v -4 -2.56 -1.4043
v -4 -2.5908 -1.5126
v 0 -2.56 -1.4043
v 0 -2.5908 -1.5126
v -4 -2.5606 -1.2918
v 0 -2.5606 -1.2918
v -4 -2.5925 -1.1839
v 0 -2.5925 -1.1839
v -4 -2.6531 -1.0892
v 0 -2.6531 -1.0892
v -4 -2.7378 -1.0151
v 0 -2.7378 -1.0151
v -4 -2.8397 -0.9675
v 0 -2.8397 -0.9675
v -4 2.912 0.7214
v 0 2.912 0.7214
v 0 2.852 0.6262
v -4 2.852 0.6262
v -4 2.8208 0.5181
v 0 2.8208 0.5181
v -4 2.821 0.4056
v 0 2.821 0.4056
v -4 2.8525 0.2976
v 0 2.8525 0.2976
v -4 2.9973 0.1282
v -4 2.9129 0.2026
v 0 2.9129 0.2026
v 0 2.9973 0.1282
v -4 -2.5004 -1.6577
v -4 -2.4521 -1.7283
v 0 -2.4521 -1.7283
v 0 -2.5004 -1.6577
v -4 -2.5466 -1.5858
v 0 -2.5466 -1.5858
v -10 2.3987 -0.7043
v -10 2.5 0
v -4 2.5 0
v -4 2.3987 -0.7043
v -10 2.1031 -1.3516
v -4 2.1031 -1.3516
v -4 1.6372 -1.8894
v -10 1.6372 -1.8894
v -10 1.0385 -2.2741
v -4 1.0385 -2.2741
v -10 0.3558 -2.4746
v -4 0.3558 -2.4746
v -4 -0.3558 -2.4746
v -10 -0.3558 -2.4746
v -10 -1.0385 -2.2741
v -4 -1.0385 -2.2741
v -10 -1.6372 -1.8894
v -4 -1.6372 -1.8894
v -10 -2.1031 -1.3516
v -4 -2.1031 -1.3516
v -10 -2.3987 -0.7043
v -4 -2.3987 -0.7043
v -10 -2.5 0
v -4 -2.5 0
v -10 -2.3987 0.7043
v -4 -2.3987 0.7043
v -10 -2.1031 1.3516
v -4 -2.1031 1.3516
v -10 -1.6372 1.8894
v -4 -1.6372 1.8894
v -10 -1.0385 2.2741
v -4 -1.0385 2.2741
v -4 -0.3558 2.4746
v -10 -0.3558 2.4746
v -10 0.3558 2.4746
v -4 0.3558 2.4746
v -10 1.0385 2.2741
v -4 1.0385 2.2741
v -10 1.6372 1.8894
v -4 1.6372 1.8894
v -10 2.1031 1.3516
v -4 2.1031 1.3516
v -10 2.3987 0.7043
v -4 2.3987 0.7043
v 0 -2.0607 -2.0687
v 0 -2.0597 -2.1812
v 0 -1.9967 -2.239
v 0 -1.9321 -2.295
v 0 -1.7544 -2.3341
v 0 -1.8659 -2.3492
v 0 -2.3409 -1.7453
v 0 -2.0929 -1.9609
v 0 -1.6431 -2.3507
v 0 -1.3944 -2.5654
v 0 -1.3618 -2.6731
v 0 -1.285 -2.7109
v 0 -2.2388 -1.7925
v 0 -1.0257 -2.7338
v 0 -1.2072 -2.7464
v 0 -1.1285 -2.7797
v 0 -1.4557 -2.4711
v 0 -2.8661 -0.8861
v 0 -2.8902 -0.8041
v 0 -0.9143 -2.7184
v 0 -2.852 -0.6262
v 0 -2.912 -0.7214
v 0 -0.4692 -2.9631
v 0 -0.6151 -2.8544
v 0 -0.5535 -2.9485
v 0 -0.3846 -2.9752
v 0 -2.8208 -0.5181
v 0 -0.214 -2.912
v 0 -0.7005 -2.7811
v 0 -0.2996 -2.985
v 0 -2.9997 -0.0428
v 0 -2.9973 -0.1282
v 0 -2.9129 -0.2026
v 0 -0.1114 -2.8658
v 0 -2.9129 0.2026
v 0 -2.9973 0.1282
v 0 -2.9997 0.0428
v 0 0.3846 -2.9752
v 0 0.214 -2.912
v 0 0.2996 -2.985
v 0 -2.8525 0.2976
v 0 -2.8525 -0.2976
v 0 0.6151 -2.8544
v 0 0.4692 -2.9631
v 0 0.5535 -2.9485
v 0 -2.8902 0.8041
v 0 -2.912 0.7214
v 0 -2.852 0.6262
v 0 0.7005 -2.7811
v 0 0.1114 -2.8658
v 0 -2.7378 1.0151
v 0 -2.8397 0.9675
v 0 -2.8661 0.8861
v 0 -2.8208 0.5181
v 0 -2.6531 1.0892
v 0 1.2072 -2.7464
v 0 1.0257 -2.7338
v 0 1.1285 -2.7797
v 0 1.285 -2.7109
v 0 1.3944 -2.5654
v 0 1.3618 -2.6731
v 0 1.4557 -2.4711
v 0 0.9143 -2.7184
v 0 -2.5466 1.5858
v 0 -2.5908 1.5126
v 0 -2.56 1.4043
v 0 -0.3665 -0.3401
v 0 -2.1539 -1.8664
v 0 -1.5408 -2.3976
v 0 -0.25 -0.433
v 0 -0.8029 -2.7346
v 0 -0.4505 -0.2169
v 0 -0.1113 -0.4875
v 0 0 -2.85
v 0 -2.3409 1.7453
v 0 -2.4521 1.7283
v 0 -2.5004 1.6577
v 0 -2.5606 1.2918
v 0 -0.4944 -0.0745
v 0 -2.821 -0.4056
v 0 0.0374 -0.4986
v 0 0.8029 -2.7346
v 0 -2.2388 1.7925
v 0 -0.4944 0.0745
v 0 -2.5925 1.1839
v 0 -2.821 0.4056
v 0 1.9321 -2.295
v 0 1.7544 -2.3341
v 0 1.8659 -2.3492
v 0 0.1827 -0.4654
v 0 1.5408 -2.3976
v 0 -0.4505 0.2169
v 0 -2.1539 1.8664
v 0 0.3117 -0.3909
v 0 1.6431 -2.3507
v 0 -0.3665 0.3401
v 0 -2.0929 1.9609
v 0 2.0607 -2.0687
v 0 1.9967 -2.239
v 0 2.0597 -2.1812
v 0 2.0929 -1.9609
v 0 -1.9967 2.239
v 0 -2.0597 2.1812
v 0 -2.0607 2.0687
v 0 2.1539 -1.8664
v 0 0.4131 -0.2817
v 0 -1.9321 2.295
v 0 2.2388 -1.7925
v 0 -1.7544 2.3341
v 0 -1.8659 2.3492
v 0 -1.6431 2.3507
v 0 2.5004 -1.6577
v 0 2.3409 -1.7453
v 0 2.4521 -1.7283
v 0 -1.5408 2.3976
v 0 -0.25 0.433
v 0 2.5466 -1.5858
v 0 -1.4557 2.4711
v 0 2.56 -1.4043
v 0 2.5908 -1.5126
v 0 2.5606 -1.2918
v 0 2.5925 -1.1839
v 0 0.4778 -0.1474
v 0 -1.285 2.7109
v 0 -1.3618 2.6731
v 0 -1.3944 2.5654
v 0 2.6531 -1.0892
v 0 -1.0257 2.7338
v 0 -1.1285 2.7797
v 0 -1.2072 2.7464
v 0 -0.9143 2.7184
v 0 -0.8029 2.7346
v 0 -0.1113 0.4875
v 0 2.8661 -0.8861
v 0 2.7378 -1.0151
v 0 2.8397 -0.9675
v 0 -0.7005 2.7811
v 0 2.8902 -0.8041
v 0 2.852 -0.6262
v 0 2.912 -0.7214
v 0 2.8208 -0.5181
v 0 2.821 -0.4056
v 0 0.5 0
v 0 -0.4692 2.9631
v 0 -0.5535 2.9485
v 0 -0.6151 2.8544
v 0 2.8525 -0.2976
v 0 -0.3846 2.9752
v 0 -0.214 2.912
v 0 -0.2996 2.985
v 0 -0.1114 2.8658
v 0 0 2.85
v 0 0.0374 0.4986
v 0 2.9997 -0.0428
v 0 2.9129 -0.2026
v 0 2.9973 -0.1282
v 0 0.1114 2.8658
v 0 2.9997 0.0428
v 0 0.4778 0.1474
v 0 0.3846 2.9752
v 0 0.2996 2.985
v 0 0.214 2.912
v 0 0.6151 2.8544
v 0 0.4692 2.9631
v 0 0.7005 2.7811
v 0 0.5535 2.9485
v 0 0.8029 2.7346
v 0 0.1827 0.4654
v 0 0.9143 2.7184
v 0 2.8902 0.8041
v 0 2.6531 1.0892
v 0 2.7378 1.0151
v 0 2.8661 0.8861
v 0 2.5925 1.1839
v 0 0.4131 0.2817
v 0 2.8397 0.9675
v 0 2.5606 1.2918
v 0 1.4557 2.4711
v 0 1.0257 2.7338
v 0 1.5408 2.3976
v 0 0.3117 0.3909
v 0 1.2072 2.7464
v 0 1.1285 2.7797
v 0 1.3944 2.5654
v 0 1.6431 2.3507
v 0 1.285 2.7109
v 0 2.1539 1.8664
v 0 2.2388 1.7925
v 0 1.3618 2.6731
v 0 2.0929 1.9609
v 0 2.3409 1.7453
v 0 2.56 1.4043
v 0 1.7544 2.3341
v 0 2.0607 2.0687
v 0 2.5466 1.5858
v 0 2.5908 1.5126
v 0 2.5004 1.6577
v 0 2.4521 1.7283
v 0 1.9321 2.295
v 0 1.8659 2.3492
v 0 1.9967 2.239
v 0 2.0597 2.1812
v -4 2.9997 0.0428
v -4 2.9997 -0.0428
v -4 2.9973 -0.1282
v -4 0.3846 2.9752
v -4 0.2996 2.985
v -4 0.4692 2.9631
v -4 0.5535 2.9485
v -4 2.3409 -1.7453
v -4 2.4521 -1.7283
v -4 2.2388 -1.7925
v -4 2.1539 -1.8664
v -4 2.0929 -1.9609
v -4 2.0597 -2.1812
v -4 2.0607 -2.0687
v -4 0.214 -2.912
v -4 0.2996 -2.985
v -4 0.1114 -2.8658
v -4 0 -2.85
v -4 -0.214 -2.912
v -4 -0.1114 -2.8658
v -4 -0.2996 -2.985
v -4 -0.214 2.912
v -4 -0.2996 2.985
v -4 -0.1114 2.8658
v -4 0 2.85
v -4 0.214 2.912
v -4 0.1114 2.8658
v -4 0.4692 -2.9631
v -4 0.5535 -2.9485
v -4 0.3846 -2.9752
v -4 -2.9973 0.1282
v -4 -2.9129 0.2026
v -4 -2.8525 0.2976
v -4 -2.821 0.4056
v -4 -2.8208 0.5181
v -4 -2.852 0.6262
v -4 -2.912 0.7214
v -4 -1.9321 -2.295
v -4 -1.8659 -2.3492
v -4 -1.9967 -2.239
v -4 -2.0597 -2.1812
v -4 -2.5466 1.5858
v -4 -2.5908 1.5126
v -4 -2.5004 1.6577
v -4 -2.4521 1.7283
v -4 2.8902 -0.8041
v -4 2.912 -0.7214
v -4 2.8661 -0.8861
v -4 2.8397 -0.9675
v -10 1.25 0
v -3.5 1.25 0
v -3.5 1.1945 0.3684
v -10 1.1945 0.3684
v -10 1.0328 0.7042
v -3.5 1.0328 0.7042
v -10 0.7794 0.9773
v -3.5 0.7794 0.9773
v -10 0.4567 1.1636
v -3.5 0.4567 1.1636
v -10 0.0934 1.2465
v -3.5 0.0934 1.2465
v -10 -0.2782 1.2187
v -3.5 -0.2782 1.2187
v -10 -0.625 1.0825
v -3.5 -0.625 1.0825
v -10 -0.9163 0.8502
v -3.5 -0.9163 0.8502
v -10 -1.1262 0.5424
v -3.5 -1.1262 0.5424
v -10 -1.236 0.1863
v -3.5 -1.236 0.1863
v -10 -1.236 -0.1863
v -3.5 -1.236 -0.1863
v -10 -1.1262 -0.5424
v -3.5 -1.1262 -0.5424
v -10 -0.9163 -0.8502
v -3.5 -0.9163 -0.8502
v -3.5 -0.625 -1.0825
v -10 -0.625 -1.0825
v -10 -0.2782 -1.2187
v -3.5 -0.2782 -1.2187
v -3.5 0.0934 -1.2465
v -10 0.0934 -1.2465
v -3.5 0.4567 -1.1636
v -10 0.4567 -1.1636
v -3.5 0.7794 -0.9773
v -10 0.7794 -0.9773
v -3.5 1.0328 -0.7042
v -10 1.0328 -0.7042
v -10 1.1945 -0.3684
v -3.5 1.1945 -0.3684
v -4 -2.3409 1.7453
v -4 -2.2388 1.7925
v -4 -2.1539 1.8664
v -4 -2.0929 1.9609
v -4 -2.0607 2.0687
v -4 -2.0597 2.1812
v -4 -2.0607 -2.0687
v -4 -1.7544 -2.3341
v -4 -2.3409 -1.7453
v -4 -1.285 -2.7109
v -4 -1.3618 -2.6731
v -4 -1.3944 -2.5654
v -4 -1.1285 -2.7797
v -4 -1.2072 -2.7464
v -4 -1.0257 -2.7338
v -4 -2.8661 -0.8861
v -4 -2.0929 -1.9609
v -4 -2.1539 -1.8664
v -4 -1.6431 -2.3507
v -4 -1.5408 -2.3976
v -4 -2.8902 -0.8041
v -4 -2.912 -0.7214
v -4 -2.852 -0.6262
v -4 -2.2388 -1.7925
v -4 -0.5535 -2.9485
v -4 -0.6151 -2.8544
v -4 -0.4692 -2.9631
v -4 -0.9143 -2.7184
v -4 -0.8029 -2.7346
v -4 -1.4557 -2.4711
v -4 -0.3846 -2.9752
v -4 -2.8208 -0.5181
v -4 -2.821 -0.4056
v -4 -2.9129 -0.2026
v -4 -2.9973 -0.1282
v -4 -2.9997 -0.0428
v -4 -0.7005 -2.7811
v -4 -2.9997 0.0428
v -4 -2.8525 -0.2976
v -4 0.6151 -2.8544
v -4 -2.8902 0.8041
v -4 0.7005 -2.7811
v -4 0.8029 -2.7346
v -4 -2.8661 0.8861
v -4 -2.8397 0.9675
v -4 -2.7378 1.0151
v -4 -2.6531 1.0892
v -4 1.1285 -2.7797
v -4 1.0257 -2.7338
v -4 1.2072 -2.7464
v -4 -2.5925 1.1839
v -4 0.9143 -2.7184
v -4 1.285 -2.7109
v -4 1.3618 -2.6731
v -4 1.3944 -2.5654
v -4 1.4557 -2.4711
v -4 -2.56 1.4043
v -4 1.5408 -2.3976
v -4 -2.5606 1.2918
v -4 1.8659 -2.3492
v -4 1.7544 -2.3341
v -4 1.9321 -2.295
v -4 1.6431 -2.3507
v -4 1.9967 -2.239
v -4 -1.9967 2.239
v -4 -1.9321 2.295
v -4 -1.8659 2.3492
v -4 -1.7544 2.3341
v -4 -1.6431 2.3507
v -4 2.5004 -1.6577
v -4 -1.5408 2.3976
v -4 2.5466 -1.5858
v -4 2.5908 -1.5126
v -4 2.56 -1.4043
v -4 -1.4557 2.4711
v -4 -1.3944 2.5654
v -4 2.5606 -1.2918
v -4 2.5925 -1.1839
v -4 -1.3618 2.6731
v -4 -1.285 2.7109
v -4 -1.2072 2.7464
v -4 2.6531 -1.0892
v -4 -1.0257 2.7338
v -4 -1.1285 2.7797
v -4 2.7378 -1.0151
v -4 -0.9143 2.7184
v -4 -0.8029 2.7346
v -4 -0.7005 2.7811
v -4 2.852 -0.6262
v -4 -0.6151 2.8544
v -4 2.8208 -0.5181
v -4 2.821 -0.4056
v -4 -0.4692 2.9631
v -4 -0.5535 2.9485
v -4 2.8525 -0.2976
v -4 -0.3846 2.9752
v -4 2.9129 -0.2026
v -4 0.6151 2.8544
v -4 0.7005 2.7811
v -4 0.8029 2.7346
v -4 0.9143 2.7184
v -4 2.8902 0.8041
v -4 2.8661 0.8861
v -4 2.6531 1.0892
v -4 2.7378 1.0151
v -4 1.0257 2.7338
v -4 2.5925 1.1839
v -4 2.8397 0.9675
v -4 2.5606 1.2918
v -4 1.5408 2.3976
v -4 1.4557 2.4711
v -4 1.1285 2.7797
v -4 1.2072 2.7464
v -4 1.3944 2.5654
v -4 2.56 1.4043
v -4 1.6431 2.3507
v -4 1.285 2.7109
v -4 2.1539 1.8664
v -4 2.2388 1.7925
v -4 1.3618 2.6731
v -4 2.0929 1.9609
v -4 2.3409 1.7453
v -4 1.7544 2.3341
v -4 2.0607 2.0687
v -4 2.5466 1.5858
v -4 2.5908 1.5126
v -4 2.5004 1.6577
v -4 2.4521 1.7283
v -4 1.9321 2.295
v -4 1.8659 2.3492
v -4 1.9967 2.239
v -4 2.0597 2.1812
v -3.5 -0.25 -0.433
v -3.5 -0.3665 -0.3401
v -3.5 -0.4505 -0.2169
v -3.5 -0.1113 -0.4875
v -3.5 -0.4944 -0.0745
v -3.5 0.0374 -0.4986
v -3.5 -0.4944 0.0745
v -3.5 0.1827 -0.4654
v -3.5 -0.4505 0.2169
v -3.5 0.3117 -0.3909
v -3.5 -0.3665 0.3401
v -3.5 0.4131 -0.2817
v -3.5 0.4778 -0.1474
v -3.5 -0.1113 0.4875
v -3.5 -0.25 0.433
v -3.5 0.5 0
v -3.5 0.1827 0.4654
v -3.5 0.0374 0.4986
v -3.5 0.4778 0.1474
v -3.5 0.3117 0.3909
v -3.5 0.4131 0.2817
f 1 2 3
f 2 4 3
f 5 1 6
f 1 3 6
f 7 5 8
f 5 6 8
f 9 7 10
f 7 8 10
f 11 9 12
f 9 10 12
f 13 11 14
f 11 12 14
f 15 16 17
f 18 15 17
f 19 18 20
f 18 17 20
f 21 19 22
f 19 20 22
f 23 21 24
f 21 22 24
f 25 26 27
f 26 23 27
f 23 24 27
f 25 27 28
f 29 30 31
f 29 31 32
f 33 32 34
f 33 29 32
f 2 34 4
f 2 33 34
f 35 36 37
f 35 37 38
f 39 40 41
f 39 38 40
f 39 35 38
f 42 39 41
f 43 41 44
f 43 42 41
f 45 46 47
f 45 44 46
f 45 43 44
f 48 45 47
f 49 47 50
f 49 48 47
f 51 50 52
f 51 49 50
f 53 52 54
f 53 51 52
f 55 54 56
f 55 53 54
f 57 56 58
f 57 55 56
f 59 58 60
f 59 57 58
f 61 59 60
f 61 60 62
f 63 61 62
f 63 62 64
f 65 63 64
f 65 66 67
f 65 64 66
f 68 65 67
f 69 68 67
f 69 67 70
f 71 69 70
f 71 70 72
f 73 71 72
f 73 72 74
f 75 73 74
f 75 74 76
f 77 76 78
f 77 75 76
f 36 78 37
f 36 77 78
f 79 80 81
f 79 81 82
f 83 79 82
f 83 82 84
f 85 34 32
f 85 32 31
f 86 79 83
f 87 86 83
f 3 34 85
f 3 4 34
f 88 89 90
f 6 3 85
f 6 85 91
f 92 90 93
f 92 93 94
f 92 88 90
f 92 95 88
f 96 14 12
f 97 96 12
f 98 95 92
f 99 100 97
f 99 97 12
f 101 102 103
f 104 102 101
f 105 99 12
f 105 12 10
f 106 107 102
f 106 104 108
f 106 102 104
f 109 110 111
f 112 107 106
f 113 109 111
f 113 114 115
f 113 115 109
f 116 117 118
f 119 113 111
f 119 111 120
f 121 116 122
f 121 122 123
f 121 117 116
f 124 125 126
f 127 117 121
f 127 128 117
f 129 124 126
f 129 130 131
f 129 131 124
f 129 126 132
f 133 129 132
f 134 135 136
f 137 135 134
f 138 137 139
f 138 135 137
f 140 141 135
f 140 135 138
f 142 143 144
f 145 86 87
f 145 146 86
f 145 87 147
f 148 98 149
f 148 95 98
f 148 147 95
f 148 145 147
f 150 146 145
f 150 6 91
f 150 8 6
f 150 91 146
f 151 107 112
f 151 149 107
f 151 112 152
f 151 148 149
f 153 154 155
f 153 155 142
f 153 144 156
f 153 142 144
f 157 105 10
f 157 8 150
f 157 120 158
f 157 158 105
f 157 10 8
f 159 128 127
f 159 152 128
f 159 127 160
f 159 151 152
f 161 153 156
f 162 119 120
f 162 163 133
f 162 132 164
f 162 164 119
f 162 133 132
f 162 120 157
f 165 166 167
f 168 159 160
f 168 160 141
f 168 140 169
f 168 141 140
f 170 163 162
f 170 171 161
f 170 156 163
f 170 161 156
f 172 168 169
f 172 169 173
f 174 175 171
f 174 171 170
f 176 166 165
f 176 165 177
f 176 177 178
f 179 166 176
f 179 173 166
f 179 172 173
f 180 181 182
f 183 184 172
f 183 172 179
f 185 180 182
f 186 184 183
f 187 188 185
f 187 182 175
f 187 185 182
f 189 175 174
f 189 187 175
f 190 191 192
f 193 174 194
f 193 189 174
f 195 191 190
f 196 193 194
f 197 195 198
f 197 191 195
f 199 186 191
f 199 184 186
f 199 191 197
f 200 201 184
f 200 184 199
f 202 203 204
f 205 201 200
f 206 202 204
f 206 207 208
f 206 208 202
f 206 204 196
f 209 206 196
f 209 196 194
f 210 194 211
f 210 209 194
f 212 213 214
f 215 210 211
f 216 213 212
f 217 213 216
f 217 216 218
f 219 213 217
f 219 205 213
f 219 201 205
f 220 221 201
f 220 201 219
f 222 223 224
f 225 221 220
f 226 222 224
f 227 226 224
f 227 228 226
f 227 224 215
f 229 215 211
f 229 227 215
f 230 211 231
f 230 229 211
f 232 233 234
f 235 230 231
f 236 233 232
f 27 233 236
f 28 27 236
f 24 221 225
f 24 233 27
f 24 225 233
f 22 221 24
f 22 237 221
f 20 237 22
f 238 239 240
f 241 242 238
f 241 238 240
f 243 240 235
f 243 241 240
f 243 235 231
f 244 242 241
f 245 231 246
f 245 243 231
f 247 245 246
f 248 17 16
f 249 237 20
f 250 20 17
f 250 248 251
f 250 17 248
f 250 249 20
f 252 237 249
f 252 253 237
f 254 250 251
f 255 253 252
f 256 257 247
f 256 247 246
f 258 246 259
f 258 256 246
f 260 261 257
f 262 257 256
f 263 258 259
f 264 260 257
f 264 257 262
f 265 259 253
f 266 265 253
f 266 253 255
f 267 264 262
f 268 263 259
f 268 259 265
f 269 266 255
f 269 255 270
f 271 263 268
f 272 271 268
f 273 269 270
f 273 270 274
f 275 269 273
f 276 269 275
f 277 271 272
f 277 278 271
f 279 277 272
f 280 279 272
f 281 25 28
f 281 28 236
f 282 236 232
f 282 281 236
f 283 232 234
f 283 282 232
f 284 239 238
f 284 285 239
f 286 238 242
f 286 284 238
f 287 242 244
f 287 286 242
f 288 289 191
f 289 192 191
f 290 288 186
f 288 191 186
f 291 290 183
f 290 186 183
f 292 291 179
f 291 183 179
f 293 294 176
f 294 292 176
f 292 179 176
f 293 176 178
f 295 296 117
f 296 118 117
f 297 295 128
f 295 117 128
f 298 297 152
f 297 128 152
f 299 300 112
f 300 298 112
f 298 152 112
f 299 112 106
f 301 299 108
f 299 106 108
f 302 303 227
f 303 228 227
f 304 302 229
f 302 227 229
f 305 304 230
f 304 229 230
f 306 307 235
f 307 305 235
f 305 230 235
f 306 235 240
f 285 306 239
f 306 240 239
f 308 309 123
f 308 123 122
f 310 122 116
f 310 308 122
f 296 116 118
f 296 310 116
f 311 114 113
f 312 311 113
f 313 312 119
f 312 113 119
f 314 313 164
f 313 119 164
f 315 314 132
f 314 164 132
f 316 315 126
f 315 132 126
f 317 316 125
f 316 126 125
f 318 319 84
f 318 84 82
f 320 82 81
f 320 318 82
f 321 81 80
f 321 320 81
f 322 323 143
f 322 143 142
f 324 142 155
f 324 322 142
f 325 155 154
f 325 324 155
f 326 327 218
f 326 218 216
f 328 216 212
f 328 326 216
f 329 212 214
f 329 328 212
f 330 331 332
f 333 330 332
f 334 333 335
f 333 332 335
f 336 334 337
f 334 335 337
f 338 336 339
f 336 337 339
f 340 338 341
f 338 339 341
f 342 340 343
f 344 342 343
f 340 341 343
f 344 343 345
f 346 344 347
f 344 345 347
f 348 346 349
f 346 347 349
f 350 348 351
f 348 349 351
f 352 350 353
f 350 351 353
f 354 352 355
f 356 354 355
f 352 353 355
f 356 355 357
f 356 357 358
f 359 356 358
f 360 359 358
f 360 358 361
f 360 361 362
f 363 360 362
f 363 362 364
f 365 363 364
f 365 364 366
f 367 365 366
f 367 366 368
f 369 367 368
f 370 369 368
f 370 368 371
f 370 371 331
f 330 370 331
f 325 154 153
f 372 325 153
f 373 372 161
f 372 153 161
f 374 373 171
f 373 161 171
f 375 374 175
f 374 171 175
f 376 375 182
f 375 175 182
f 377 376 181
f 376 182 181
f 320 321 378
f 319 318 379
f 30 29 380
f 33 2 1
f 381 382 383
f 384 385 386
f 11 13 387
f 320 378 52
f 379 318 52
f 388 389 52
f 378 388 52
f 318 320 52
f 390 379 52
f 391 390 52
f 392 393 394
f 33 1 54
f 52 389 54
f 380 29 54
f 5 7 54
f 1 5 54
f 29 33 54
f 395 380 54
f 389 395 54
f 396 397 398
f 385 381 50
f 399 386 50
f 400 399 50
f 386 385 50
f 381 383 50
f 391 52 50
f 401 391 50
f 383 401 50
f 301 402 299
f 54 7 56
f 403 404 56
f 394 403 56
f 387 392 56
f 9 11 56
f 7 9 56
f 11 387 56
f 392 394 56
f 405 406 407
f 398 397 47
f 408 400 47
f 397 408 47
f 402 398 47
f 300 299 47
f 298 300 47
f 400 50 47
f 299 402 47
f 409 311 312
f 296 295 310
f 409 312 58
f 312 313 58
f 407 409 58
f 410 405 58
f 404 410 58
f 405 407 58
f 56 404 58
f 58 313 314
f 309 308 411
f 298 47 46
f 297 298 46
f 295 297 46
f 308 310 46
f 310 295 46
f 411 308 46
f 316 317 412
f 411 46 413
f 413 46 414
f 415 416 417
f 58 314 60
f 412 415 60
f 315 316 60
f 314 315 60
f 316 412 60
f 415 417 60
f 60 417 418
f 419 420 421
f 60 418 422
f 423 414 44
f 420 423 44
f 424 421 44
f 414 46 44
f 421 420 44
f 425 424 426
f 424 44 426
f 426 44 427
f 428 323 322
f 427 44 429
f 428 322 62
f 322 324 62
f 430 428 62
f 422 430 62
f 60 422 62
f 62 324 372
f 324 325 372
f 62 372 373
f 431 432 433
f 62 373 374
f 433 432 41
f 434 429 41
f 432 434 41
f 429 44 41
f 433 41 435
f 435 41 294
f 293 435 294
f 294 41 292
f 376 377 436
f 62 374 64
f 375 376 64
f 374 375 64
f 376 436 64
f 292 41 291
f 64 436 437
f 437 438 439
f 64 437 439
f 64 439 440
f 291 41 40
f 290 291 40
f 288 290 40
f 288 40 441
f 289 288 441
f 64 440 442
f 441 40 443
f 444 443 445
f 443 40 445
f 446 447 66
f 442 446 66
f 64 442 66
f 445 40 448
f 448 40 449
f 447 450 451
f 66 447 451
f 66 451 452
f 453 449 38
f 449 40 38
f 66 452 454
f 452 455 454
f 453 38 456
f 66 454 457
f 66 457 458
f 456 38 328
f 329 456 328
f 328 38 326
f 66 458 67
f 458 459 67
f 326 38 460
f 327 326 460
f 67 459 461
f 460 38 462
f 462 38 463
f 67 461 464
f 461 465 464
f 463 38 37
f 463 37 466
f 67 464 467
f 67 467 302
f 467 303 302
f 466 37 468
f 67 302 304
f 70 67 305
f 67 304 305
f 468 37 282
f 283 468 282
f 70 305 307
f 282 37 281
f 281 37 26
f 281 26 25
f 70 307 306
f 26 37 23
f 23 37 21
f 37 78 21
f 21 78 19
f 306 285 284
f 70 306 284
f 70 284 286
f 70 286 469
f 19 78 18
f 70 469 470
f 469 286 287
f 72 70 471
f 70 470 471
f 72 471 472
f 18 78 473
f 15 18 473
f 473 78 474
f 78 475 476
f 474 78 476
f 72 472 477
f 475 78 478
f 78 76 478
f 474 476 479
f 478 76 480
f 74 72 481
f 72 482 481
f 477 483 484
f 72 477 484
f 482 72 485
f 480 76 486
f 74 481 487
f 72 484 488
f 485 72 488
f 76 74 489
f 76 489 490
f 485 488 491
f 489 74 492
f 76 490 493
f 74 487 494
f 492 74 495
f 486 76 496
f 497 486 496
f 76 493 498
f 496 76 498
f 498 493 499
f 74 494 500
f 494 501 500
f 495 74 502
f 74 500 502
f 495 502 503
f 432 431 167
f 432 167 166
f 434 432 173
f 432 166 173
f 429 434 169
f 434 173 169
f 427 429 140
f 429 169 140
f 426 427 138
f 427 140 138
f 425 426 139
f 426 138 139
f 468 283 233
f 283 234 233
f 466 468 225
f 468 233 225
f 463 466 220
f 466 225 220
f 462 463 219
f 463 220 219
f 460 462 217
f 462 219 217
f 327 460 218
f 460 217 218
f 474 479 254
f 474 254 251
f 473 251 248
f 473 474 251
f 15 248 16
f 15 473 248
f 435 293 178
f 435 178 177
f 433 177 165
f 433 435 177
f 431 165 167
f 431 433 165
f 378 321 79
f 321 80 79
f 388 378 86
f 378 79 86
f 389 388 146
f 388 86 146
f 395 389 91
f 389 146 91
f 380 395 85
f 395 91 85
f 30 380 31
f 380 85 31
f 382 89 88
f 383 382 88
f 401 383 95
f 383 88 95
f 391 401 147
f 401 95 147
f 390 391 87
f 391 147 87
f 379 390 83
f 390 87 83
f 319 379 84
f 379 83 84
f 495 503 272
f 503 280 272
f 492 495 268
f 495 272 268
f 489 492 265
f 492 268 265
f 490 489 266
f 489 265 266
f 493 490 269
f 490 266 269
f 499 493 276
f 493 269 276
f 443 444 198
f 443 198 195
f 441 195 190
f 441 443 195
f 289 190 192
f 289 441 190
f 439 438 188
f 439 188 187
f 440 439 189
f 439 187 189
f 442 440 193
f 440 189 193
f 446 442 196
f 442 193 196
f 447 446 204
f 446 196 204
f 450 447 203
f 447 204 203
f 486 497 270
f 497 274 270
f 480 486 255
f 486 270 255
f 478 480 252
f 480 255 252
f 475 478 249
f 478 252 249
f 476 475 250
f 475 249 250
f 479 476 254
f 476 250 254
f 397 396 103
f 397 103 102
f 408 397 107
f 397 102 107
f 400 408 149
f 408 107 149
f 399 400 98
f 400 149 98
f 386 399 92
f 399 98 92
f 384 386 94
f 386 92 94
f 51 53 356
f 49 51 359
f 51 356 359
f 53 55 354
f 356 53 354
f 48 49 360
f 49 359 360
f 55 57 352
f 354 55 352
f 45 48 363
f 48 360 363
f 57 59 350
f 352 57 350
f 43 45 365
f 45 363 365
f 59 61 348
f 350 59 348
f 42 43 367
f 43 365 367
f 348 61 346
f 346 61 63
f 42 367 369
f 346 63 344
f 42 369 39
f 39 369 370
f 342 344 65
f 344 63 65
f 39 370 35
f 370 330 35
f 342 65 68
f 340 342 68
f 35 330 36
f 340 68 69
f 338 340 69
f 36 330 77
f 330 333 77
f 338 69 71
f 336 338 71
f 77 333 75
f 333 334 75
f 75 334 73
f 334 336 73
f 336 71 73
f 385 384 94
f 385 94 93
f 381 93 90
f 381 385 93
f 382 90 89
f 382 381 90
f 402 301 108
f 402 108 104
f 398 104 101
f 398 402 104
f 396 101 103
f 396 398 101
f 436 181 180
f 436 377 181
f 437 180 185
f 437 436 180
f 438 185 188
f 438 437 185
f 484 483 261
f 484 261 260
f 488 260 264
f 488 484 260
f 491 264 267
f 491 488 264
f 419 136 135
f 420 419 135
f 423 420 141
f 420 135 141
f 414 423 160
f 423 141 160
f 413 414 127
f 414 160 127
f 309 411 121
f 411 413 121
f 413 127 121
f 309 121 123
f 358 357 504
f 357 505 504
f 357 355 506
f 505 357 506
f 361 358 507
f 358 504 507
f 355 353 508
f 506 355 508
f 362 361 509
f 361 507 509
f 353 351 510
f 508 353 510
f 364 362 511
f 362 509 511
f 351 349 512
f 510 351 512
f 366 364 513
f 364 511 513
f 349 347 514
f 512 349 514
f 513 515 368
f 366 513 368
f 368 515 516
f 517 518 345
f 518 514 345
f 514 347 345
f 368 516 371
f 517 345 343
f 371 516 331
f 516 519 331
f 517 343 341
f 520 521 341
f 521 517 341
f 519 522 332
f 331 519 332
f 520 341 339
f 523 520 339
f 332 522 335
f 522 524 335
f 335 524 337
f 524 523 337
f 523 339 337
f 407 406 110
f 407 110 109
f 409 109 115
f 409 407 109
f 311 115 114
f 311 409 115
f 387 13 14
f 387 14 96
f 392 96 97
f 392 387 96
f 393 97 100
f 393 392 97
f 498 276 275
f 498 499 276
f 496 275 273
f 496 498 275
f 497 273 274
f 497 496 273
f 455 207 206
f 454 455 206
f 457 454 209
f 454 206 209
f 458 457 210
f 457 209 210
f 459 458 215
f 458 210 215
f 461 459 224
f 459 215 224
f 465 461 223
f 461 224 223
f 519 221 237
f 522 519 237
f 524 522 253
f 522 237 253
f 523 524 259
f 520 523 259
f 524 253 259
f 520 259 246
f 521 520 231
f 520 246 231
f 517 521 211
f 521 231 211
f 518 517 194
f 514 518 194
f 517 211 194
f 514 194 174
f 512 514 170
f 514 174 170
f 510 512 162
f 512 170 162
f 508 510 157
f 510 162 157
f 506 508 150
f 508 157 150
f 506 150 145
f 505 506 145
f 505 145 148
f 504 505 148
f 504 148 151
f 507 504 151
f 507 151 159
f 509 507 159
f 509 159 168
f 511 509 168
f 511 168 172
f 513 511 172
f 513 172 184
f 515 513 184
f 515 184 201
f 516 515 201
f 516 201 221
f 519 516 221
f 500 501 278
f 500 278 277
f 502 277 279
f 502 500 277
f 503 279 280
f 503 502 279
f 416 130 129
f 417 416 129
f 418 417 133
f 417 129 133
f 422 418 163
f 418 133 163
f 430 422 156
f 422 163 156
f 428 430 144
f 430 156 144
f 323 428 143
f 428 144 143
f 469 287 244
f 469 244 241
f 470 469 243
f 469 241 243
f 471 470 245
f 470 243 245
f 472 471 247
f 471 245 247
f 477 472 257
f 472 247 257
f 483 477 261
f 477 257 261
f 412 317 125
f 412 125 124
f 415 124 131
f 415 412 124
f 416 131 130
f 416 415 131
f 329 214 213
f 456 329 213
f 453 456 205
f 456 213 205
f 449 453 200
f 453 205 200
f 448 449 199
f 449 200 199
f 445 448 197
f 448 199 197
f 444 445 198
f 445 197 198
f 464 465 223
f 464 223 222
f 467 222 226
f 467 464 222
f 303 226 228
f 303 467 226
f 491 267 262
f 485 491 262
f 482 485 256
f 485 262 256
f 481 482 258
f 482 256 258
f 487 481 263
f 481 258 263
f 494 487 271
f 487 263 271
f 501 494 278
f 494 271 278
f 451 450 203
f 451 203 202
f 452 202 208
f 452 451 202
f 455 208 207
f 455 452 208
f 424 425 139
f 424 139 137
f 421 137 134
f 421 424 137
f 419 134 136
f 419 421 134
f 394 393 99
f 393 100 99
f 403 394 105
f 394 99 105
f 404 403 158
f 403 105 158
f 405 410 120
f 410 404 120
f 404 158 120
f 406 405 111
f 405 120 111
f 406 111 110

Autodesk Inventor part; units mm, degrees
ref_plane "YZ-Ebene" through (0, 0, 0) normal (1, 0, 0) x (0, 1, 0)
ref_plane "XZ-Ebene" through (0, 0, 0) normal (0, 1, 0) x (-1, 0, 0)
ref_plane "XY-Ebene" through (0, 0, 0) normal (0, 0, 1) x (1, 0, 0)
sketch "Skizze1" plane through (0, 0, 0) normal (0, 0, 1) x (1, 0, 0)
  line L0 (-12, 0) -> (2, 0) projected
  line L1 (0, -0.6) -> (0, 3.6) projected
  line L2 (0, 3) -> (-4, 3)
  line L3 (-4, 3) -> (-4, 2.5)
  line L4 (-4, 2.5) -> (-10, 2.5)
  line L5 (-10, 2.5) -> (-10, 1.25)
  line L6 (-10, 1.25) -> (-3.5, 1.25)
  line L7 (-3.5, 1.25) -> (-3.5, 0.5)
  line L8 (-3.5, 0.5) -> (0, 0.5)
  point P0 (0, 0)
  dimension "d1" = 6
  dimension "d2" = 1
  dimension "d3" = 5
  dimension "d4" = 2.5
  dimension "d5" = 6.5
  dimension "d6" = 4
  dimension "d7" = 10
revolve "Umdrehung1" add sketch "Skizze1" angle 360 about axis through (-10, 0, 0) along (1, 0, 0)
sketch "Skizze2" plane through (0, 0, 0) normal (1, 0, 0) x (0, 0, -1)
  line L0 (0, -4.2) -> (0, 4.2) projected
  line L1 (4.33, 0) -> (-4.98, 0) projected
  circle A0 centre (-3.25, 0) radius 0.4
  dimension "d11" = 0.8
  dimension "d12" = 6.5
extrude "Extrusion1" cut sketch "Skizze2" against normal blind 4
pattern_circular "Runde Anordnung1" count 22 over 360 about axis through (-10, 0, 0) along (1, 0, 0) of "Extrusion1"
thread "Gewinde1" size "M3x0.5" class "6H" standard "ANSI Metric M Profile" length 7
properties part number "Nadelhalter_ra8846s" material "Aluminium 6061"
